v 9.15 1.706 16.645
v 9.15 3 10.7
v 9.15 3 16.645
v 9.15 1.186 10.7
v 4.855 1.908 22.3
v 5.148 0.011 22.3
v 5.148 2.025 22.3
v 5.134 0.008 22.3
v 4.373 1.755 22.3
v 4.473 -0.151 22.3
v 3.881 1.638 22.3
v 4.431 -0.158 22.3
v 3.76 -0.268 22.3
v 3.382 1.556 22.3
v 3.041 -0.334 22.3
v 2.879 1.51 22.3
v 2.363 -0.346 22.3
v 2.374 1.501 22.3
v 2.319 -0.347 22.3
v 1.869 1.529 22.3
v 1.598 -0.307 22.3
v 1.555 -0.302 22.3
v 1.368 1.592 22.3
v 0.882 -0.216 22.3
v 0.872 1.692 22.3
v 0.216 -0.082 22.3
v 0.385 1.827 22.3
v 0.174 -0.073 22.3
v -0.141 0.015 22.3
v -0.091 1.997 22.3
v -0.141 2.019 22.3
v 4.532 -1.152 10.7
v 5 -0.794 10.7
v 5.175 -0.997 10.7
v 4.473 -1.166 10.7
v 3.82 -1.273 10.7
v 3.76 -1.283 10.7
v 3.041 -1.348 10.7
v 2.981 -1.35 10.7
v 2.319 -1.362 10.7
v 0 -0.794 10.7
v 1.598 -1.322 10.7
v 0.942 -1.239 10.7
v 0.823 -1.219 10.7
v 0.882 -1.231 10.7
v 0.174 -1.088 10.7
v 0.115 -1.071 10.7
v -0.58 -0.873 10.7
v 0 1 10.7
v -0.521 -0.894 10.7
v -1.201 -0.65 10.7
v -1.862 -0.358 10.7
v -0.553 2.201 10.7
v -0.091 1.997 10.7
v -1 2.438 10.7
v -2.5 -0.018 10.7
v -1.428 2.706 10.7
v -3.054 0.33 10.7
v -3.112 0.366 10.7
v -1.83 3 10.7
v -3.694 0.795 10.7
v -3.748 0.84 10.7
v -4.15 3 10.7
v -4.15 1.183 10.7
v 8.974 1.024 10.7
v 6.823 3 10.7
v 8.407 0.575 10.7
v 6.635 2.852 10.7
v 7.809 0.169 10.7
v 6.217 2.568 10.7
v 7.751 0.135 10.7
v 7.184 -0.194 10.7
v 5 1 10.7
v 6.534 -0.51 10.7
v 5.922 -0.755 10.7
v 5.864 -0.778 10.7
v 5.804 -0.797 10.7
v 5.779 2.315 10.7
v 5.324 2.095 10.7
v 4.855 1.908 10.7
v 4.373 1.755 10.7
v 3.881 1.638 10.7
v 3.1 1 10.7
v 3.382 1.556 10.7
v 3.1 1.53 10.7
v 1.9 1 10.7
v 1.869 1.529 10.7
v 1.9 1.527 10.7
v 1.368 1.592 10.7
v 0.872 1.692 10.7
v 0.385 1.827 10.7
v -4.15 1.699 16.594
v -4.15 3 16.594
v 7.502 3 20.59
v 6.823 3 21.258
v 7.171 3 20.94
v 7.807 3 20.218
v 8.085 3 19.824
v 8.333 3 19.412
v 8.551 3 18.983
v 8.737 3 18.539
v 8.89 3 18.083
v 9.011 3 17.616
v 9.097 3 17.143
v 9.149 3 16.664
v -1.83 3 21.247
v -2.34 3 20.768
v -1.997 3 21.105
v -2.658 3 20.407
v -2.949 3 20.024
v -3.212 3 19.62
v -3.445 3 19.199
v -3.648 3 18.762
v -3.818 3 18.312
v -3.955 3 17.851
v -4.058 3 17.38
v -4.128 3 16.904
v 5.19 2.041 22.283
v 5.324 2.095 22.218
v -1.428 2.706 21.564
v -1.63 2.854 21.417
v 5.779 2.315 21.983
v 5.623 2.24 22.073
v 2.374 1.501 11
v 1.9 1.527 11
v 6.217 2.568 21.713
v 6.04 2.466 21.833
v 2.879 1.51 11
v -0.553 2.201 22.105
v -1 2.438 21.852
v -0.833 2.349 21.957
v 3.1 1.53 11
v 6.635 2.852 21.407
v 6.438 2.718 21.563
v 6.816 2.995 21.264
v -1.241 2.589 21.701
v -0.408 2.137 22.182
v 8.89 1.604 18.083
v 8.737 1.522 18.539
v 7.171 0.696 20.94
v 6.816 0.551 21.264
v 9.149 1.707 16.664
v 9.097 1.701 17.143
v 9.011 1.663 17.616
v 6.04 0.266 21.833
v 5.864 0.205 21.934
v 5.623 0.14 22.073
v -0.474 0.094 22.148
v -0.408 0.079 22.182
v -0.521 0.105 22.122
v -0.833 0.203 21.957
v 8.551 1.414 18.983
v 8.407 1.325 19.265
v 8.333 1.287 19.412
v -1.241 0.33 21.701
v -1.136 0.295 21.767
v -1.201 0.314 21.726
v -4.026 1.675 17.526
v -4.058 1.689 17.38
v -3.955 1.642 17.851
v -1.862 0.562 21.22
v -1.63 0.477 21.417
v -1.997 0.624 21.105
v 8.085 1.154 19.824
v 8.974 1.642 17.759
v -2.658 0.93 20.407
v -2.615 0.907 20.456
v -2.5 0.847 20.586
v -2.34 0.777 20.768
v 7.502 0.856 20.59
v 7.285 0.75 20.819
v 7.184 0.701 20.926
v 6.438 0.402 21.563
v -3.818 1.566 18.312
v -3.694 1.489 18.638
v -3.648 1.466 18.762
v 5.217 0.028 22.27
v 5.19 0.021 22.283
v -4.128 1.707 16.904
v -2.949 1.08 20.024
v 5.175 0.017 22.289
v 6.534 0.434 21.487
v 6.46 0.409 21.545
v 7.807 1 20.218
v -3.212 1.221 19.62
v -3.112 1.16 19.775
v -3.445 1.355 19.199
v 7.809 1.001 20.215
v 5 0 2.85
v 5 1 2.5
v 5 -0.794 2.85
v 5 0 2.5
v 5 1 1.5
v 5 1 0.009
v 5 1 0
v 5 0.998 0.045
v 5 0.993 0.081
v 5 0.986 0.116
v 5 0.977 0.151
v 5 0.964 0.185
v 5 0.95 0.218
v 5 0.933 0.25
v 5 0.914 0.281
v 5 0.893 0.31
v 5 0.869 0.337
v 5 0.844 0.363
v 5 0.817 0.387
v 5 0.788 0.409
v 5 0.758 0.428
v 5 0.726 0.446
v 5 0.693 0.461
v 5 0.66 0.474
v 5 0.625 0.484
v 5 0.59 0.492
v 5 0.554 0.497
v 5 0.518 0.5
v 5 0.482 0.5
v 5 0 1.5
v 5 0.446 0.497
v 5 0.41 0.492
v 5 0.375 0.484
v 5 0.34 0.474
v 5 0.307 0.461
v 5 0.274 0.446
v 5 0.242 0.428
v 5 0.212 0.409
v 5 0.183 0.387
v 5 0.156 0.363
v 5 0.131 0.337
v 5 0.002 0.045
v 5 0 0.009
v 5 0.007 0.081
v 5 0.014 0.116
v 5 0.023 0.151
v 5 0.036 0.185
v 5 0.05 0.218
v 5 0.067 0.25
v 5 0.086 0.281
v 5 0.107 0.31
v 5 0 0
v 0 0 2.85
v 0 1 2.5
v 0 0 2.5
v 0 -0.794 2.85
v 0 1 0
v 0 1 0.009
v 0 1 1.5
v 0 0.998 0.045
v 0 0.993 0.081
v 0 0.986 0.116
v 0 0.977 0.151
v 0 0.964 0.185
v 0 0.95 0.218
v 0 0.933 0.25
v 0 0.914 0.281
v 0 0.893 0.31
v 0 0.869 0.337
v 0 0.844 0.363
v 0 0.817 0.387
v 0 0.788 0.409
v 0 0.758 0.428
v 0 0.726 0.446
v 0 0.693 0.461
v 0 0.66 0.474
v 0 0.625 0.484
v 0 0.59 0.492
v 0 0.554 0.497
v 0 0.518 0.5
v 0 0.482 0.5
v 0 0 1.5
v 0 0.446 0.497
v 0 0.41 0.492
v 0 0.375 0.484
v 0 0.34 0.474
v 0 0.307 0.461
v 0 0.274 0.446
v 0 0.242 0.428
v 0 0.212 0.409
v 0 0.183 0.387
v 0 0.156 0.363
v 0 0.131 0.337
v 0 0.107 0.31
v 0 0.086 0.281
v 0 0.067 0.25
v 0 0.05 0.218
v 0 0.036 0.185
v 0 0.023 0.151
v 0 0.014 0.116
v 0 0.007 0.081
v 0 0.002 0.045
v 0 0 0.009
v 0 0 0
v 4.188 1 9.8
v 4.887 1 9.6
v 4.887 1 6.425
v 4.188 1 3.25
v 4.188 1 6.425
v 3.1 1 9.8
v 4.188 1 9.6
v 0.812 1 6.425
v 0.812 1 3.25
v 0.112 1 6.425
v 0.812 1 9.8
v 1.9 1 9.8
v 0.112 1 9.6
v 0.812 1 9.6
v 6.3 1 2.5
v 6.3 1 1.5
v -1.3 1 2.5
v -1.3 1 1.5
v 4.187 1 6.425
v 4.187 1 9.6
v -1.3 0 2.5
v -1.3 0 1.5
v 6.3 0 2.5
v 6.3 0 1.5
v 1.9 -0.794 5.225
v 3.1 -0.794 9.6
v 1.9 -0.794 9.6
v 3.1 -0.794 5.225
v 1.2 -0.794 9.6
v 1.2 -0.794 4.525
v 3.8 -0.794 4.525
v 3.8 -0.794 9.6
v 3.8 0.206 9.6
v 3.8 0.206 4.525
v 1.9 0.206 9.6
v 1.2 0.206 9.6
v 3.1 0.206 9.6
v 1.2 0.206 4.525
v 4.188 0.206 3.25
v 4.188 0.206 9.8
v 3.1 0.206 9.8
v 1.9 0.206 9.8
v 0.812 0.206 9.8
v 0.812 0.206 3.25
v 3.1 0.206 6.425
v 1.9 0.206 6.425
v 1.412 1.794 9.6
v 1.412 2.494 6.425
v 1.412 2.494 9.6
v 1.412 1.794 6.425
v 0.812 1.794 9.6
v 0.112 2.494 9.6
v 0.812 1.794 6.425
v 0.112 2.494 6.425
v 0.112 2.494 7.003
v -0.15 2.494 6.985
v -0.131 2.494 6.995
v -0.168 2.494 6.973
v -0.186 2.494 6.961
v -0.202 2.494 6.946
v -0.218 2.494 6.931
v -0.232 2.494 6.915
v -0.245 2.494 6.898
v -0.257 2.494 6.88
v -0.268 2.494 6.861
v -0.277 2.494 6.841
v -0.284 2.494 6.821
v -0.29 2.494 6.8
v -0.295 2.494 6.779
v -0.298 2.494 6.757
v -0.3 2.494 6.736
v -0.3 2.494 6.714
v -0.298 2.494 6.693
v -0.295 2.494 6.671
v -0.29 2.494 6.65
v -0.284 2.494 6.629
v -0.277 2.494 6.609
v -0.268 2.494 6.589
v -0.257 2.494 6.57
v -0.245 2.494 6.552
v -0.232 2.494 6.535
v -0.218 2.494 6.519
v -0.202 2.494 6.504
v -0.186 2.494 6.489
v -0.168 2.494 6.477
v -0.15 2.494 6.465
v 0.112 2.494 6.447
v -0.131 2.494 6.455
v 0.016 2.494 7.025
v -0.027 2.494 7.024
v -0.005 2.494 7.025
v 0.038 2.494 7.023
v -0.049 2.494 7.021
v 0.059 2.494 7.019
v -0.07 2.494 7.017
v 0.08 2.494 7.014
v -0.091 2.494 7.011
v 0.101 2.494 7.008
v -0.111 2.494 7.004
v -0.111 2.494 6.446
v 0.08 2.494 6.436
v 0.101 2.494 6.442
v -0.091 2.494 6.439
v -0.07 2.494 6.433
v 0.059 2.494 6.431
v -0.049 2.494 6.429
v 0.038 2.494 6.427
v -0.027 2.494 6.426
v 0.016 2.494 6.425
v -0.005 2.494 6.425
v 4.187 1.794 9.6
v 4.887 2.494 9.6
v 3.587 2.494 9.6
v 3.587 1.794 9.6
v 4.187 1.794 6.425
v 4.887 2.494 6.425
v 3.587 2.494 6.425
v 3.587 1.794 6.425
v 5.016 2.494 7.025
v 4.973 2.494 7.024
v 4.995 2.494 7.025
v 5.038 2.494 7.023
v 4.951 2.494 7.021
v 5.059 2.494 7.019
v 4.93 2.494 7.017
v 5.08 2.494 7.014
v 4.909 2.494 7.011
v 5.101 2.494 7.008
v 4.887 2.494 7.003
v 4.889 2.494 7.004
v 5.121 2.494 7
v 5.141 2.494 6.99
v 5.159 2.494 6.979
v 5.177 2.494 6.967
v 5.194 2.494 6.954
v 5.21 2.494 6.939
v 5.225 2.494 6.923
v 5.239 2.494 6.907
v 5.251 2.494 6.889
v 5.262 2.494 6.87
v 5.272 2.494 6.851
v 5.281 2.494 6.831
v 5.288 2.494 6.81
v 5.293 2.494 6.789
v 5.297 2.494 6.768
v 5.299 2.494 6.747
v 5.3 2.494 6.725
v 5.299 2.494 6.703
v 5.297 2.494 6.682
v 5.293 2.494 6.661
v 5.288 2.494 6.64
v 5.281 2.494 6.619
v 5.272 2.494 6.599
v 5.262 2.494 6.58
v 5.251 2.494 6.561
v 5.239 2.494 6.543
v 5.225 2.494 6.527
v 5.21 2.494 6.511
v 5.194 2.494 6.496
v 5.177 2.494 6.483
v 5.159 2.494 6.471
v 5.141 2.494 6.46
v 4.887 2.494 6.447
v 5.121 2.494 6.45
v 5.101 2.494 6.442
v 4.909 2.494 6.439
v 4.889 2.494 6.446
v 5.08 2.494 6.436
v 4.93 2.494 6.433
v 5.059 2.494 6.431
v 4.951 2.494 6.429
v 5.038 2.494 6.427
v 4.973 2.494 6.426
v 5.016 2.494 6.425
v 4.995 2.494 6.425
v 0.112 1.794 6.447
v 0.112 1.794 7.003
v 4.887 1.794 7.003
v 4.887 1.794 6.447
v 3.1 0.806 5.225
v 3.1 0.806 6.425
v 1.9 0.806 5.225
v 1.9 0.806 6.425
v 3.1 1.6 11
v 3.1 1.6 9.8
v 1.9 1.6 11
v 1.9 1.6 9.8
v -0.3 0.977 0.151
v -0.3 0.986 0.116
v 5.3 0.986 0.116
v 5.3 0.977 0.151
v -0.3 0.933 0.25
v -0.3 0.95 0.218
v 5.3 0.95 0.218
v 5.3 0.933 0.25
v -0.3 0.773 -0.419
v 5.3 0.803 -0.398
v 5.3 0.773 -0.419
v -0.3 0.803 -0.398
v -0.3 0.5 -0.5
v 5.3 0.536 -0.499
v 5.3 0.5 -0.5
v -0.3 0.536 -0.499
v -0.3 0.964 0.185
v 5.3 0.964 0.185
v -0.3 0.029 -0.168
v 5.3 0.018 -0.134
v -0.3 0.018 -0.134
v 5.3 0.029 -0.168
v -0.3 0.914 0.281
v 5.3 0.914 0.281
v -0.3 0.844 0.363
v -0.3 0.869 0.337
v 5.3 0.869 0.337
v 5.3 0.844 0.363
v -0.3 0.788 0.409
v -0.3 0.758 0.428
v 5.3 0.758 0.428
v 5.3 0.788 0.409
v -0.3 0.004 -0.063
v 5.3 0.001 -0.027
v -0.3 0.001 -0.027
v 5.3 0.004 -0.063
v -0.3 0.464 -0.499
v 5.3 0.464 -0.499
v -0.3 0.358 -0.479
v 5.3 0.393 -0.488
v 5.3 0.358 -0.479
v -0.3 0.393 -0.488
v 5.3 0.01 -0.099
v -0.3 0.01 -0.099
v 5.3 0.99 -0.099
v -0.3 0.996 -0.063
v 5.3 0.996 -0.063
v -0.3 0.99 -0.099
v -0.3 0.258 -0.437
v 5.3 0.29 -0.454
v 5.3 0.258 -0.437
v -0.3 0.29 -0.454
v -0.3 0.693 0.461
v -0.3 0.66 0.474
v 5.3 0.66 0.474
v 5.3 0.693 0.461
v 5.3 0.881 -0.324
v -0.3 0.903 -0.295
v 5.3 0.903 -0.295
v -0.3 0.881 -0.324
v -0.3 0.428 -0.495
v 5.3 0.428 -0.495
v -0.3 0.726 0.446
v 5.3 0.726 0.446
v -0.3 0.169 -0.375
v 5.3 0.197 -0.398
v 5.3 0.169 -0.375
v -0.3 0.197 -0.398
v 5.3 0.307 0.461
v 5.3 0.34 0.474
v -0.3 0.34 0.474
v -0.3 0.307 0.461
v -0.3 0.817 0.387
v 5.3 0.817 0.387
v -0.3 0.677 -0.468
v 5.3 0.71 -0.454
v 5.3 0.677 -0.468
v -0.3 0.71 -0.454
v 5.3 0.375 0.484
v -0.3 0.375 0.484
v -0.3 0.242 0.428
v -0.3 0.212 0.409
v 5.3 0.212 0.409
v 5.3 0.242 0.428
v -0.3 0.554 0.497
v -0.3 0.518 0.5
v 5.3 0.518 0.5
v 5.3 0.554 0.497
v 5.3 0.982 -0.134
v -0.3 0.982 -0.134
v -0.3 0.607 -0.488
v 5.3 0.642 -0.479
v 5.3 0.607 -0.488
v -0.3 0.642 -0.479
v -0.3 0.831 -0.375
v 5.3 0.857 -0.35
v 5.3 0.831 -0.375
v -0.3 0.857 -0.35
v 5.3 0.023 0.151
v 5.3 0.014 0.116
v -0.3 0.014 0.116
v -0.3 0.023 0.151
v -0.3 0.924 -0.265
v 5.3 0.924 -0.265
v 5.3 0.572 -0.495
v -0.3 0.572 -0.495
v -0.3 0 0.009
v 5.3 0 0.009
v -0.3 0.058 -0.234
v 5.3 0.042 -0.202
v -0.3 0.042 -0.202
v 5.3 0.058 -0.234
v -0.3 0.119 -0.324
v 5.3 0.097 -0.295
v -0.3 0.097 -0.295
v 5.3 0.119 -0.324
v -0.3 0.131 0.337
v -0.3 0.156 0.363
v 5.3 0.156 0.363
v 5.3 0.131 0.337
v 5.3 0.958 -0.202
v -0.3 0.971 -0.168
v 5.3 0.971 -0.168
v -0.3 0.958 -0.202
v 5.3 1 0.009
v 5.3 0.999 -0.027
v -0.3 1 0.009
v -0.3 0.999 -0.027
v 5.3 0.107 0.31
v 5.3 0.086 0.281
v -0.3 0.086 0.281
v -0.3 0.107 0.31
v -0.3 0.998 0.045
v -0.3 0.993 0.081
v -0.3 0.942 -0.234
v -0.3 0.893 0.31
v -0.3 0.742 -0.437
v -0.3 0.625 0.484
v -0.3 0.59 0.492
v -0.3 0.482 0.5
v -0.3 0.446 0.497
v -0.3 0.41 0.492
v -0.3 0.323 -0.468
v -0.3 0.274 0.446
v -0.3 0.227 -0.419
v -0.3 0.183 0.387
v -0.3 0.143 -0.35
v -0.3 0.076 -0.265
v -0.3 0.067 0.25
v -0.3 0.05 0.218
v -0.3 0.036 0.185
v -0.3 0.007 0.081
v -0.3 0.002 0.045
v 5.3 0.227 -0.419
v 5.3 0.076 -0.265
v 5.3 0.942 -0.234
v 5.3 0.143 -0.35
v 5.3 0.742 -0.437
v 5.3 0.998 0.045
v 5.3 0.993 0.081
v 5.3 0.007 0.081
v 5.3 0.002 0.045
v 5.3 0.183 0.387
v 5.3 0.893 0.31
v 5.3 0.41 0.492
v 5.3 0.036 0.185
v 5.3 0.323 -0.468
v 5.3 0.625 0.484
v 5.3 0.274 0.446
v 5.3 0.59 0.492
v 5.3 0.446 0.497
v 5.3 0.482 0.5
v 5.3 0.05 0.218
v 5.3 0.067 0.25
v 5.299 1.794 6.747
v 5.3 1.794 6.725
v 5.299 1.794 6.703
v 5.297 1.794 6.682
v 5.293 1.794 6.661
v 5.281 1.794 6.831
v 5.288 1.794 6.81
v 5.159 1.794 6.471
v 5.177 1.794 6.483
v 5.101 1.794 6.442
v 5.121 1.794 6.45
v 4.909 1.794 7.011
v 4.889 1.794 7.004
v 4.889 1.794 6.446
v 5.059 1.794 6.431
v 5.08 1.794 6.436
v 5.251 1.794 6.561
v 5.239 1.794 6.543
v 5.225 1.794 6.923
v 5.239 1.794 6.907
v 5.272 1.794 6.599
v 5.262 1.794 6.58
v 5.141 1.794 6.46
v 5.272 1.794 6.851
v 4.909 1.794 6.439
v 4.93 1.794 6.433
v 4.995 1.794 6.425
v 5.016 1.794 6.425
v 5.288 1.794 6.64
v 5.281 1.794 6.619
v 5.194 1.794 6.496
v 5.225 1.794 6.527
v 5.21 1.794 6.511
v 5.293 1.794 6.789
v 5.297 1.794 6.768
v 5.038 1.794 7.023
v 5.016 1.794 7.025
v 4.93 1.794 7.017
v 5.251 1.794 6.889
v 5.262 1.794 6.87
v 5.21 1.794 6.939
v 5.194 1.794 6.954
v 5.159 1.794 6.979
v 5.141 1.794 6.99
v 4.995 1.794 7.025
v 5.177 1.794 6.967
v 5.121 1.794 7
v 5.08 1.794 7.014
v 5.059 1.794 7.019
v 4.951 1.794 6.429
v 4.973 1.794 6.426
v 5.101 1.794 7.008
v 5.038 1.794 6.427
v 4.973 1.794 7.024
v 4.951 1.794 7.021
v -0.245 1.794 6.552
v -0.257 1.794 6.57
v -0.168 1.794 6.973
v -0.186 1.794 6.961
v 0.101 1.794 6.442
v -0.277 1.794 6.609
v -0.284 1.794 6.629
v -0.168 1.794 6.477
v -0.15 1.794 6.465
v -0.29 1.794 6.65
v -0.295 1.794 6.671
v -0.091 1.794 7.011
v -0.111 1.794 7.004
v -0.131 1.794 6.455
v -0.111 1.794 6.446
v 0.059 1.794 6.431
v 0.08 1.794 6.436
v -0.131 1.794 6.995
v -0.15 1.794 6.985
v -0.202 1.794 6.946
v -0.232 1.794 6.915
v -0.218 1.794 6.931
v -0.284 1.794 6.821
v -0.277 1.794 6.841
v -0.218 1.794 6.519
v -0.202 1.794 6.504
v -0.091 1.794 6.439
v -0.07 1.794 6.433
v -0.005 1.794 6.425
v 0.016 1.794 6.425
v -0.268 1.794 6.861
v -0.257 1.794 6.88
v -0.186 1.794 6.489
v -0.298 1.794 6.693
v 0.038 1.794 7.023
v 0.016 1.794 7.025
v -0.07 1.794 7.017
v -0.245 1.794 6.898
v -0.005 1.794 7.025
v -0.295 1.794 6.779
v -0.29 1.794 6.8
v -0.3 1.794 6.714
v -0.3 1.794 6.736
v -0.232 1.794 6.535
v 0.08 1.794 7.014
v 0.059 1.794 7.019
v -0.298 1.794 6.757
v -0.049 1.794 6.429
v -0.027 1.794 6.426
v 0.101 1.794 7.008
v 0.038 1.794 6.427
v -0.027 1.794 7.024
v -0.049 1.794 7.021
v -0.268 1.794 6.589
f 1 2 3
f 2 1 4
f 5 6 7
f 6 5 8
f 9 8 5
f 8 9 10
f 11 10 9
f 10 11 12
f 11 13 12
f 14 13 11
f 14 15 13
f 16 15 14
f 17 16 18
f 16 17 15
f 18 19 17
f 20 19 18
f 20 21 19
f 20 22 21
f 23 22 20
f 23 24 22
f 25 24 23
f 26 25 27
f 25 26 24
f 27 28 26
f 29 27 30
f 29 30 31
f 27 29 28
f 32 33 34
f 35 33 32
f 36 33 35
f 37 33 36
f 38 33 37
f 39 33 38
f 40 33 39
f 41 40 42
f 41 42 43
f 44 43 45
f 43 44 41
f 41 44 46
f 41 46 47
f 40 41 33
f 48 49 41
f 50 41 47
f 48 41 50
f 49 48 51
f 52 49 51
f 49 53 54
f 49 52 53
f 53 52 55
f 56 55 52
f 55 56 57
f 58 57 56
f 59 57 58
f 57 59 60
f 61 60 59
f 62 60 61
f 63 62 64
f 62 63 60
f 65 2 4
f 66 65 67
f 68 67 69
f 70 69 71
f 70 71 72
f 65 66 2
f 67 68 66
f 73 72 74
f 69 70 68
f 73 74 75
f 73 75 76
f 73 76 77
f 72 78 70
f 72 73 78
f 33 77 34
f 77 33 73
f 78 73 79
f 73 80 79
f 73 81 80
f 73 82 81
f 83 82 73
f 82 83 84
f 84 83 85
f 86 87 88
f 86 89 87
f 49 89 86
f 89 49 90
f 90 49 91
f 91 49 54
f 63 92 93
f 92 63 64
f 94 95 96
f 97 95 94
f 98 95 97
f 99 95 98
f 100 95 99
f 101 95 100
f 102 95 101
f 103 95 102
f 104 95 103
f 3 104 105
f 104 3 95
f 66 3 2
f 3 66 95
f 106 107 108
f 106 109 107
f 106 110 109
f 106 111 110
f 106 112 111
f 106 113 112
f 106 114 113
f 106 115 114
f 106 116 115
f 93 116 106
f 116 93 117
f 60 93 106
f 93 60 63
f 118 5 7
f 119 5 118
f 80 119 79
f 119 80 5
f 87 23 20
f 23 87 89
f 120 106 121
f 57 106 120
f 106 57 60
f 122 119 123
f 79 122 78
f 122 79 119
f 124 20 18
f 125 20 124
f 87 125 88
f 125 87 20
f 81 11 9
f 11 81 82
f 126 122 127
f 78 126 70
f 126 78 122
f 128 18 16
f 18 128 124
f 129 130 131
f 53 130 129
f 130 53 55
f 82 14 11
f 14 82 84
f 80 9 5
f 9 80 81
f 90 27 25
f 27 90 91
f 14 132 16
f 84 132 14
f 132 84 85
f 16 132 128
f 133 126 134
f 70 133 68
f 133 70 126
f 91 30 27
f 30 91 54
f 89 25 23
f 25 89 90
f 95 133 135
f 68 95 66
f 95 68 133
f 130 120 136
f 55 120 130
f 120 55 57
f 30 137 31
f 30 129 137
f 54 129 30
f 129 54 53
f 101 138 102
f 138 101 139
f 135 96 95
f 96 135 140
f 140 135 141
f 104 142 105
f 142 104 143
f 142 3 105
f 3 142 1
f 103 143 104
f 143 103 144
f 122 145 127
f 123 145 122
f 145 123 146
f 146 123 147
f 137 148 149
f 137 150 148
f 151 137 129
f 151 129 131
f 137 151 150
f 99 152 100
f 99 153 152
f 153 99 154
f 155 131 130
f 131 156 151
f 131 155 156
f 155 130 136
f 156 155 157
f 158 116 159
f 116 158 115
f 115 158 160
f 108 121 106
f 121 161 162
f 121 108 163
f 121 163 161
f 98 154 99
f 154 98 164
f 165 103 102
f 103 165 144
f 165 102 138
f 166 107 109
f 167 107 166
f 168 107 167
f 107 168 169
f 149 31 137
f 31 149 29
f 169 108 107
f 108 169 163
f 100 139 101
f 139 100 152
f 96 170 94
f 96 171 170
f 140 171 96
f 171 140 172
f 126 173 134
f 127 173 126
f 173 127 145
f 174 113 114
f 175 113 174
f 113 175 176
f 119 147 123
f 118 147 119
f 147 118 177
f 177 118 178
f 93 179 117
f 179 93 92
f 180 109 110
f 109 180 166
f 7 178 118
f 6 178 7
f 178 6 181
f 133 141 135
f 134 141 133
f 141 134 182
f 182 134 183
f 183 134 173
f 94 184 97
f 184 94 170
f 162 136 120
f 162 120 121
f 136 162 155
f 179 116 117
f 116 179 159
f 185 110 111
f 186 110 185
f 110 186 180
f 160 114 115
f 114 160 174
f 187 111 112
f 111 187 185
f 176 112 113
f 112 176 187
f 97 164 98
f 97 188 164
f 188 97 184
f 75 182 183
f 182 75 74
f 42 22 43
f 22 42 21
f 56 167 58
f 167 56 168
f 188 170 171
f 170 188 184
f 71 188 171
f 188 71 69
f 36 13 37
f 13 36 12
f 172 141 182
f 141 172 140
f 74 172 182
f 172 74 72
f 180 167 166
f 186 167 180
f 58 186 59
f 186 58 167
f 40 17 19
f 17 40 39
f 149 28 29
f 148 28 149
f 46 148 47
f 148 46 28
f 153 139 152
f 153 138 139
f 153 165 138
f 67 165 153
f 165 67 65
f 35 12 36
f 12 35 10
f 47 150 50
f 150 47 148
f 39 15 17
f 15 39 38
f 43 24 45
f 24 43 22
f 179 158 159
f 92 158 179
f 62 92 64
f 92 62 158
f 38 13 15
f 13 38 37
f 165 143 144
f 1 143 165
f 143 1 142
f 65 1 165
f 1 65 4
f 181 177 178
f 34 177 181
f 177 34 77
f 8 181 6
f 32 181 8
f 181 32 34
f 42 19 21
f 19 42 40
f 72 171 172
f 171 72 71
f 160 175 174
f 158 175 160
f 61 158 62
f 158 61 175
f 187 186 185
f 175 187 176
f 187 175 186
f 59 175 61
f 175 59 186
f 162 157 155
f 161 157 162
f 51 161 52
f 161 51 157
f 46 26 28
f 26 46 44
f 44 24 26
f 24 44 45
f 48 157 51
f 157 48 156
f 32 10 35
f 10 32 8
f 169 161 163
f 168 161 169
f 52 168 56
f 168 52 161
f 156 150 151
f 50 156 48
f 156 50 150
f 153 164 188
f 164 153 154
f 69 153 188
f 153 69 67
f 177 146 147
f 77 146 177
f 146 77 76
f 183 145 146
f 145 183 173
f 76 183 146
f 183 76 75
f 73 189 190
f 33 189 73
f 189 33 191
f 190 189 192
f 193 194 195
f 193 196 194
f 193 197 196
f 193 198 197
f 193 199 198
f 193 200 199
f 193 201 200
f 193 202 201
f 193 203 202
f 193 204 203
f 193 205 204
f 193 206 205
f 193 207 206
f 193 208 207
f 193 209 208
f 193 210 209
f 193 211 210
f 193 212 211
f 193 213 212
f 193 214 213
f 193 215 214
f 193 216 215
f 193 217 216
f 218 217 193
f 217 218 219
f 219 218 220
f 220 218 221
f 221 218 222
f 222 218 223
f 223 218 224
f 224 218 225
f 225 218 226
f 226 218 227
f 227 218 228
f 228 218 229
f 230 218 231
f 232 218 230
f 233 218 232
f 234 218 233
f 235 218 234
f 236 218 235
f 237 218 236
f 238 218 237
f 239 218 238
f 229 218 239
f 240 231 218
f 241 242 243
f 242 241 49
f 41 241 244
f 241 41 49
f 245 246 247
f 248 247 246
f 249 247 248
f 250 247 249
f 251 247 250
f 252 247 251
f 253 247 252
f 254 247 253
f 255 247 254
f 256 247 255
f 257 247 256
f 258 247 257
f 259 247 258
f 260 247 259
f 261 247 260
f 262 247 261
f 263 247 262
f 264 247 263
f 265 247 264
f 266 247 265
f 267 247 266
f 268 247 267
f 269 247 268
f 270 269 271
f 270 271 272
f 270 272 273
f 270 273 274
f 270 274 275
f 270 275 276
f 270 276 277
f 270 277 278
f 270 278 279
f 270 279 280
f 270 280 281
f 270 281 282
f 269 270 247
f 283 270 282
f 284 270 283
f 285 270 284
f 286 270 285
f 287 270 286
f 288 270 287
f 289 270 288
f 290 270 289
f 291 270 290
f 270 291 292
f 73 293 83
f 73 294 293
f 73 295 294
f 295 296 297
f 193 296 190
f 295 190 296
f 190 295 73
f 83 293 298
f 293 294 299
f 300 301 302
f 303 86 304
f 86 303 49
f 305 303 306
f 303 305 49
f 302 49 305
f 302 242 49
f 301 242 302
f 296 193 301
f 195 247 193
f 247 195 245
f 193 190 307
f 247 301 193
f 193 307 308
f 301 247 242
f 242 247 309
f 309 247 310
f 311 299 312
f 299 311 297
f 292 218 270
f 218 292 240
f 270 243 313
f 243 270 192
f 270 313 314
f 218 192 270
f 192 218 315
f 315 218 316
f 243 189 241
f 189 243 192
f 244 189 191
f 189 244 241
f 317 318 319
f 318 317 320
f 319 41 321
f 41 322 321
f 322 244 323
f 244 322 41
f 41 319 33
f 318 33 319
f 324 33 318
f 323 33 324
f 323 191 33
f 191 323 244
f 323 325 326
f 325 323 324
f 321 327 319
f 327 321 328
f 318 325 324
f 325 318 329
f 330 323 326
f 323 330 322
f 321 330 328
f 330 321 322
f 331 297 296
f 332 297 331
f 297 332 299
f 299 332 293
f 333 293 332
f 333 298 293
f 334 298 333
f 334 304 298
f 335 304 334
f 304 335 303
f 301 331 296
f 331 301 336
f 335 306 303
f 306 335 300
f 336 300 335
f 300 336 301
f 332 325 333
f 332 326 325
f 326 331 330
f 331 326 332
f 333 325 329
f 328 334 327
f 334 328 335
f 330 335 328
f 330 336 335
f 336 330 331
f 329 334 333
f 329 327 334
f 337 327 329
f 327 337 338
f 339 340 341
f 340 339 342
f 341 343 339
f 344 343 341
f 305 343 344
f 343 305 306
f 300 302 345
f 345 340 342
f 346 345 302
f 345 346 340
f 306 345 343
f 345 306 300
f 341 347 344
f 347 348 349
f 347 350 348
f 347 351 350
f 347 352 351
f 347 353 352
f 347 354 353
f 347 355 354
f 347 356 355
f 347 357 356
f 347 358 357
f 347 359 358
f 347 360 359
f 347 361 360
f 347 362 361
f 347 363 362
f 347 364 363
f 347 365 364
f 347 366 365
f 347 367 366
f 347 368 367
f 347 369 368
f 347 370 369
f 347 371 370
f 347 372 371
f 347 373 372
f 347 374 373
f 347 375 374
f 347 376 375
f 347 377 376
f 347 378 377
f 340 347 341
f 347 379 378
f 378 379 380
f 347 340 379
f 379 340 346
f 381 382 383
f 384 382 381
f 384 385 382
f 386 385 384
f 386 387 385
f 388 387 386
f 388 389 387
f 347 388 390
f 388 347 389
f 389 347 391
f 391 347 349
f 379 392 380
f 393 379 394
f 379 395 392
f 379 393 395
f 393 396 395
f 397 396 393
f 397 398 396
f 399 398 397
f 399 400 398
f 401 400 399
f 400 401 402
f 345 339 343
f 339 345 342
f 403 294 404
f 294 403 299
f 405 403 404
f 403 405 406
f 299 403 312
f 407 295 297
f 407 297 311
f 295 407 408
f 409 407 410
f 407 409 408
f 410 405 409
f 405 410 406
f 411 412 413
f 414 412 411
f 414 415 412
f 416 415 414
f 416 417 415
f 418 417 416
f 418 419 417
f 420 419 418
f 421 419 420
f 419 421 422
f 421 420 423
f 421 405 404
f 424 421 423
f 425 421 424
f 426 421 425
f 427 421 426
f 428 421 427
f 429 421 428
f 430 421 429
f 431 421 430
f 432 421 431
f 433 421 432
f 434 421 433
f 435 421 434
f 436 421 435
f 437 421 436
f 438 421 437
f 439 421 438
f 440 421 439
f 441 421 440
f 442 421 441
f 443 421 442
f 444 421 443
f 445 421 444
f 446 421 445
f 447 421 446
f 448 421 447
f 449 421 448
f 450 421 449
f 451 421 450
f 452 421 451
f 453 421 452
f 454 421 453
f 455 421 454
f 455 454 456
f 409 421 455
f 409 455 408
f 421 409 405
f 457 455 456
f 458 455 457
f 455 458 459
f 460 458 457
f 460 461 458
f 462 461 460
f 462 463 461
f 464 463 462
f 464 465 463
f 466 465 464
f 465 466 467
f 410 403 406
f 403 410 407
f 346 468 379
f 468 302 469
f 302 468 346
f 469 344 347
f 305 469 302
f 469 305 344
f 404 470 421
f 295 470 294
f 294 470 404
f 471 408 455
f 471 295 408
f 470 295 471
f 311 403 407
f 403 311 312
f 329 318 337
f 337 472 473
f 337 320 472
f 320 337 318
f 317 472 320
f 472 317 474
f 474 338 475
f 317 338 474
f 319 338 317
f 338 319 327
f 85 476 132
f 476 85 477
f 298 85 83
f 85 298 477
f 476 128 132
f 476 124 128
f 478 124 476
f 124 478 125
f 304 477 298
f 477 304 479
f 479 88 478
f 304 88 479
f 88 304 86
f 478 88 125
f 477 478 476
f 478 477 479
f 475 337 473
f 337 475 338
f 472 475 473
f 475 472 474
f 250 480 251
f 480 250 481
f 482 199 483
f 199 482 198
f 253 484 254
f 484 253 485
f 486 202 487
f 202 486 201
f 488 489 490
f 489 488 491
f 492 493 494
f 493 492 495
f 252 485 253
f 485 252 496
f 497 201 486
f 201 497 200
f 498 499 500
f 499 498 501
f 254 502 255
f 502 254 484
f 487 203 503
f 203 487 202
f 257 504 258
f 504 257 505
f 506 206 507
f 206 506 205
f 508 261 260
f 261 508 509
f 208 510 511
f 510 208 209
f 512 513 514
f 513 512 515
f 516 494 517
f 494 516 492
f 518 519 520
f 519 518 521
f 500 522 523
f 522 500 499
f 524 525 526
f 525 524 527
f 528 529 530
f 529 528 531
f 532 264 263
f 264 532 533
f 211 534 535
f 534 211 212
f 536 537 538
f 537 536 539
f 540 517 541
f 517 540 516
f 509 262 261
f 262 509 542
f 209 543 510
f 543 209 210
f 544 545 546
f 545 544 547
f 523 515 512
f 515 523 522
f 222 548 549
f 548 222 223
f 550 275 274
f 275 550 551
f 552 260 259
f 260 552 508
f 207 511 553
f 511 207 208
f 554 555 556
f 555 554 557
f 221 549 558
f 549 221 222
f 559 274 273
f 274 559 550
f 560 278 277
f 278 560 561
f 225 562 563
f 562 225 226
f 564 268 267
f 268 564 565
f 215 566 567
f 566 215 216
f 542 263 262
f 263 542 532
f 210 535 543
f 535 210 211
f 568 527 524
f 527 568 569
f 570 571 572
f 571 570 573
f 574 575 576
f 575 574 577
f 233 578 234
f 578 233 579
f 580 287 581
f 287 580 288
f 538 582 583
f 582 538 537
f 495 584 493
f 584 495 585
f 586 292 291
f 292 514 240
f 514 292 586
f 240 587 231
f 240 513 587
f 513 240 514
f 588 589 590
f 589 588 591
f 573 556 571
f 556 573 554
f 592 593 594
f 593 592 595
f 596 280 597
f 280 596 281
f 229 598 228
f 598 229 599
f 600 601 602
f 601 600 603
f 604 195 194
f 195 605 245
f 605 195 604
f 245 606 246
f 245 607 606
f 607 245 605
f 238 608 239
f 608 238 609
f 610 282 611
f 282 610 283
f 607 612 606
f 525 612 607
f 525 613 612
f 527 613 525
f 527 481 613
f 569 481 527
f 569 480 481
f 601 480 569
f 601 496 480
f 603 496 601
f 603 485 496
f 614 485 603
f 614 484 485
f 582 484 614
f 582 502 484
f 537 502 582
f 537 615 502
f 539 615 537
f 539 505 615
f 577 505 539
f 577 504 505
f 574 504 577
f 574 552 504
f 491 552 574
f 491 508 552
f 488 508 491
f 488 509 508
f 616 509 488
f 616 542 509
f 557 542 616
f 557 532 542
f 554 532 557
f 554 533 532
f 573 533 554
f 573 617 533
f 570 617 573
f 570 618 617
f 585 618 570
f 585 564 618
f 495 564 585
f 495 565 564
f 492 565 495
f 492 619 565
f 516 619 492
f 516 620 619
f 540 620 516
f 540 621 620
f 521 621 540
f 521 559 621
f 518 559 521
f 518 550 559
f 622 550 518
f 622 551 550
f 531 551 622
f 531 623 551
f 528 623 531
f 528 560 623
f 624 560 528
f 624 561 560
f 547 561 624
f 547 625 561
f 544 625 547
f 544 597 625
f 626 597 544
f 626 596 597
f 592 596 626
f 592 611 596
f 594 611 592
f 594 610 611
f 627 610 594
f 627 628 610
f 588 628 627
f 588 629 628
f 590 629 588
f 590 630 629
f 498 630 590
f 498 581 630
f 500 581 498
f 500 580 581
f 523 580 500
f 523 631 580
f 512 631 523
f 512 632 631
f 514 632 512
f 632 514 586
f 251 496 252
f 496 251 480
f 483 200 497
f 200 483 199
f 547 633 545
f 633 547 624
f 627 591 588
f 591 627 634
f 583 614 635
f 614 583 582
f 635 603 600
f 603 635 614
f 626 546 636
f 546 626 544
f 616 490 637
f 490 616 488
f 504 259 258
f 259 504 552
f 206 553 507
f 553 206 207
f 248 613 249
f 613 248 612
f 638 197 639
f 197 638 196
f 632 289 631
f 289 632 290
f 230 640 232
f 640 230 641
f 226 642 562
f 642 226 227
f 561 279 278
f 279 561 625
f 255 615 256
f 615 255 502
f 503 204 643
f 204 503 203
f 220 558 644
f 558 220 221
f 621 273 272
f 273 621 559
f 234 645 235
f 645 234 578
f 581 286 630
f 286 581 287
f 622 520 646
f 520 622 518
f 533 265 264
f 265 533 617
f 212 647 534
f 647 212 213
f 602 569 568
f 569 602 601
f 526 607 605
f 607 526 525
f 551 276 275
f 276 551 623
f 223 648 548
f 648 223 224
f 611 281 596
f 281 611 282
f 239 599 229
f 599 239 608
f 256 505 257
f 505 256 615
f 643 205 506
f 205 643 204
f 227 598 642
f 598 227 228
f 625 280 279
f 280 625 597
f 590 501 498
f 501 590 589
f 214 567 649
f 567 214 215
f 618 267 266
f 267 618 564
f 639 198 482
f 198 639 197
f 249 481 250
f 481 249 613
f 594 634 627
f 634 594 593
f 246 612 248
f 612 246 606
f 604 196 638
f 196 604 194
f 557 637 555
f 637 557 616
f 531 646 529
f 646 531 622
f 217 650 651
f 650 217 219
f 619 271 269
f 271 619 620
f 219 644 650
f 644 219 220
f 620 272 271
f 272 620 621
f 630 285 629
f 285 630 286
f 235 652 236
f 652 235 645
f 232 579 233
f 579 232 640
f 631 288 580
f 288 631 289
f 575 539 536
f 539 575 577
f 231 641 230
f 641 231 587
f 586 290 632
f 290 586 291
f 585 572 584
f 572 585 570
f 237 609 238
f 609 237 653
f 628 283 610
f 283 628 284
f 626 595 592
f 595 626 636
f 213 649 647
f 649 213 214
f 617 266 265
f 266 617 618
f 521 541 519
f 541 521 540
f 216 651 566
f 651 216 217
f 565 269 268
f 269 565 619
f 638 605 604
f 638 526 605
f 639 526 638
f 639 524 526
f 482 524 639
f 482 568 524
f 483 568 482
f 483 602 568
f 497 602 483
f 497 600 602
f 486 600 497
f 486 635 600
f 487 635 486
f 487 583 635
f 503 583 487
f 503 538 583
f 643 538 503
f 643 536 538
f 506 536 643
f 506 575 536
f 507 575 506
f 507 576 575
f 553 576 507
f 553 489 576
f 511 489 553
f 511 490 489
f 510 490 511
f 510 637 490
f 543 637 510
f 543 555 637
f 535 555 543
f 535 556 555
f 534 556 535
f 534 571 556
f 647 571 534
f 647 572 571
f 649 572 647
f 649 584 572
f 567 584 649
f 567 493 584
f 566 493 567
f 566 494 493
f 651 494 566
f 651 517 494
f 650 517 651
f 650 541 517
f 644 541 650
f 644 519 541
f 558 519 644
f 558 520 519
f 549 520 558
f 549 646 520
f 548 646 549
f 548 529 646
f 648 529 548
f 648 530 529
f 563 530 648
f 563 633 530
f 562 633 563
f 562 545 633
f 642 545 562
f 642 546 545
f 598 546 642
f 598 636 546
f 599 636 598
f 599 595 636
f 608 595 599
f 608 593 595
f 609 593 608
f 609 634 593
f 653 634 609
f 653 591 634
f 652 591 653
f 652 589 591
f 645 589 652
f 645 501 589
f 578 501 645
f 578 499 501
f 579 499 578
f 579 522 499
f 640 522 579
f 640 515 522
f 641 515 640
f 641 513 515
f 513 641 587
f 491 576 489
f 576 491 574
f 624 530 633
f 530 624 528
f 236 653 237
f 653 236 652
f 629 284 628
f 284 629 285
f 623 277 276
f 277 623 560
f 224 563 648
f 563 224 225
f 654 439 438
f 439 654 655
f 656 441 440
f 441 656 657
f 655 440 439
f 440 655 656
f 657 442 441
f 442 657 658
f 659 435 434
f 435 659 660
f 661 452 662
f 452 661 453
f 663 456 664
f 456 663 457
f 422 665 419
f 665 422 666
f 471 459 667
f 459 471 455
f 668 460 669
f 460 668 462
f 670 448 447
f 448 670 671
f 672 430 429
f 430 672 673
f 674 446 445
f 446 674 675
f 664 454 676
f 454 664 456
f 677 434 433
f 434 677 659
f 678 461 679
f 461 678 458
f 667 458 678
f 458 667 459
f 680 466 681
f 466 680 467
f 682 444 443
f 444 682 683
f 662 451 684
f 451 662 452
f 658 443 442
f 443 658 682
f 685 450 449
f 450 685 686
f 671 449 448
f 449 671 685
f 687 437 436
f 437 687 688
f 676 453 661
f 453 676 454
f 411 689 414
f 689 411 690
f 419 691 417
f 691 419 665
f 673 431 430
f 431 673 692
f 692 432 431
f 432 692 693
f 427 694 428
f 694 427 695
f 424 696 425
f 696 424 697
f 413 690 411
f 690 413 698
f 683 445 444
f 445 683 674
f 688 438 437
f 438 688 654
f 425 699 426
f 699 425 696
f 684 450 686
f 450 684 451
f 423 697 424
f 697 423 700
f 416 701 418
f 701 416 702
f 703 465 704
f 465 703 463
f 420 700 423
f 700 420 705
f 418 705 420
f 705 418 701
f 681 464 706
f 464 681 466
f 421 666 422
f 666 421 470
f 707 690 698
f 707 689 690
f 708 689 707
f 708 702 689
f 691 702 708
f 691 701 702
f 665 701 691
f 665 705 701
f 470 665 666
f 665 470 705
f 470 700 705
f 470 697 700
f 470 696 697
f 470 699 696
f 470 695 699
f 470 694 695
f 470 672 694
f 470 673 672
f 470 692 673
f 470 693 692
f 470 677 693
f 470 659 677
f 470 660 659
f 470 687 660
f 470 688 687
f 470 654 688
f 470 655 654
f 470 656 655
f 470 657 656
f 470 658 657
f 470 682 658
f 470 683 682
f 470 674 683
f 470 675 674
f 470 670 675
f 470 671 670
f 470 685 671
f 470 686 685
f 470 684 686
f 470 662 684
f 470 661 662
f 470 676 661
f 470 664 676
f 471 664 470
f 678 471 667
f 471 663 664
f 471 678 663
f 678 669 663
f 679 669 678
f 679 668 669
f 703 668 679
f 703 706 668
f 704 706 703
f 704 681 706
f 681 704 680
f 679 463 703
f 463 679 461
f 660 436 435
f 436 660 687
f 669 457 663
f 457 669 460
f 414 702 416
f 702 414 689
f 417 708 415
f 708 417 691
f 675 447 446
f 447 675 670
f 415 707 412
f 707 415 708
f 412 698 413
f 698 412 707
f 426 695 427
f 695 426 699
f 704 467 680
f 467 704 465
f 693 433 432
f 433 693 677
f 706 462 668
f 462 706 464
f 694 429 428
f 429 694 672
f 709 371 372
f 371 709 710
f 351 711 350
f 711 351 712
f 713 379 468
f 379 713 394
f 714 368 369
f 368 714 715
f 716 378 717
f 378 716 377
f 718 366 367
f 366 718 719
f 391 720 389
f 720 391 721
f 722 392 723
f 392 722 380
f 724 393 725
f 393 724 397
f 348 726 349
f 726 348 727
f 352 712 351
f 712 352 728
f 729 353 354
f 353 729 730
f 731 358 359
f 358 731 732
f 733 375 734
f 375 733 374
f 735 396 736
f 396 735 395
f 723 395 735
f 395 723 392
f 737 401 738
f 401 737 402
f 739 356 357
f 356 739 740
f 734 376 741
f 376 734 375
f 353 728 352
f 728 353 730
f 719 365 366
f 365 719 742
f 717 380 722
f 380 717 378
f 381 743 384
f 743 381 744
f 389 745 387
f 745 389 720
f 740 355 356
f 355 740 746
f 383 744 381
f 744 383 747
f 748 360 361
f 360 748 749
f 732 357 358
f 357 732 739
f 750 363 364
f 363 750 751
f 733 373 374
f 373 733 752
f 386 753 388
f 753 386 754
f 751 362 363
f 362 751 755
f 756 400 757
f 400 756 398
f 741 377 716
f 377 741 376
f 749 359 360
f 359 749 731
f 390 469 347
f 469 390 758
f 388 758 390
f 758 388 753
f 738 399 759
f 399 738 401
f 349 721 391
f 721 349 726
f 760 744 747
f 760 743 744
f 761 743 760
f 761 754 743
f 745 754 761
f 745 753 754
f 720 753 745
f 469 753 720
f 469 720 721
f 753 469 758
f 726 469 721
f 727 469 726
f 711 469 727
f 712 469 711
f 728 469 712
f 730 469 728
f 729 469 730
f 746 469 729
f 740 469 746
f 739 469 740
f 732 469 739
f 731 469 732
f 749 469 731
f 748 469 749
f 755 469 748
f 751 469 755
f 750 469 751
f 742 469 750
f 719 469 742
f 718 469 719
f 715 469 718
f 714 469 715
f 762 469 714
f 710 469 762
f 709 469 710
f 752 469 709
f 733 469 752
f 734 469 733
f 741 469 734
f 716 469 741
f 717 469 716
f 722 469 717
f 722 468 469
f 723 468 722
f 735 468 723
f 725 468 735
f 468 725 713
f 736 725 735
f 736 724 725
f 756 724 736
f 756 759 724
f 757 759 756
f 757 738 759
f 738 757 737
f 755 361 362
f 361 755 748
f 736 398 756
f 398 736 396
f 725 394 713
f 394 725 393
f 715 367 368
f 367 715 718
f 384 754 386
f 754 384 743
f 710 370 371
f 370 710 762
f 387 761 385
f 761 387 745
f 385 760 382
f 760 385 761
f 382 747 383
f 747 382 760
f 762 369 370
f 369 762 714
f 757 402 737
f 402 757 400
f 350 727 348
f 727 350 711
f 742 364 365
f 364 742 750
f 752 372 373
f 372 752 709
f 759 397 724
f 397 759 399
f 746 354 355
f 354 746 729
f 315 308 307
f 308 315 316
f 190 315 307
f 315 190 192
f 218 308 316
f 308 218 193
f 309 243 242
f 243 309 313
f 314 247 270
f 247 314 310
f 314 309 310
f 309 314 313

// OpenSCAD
/*
    This file is part of the DodoHand project. This project aims to create 
    an open implementation of the DataHand keyboard, capable of being created
    with commercial 3D printing services.

    Copyright (C) 2013 Scott Fohey

    This program is free software: you can redistribute it and/or modify
    it under the terms of the GNU General Public License as published by
    the Free Software Foundation, either version 3 of the License, or
    (at your option) any later version.

    This program is distributed in the hope that it will be useful,
    but WITHOUT ANY WARRANTY; without even the implied warranty of
    MERCHANTABILITY or FITNESS FOR A PARTICULAR PURPOSE.  See the
    GNU General Public License for more details.

    You should have received a copy of the GNU General Public License
    along with this program.  If not, see <http://www.gnu.org/licenses/>.
*/

// this is the 5-key assembly scad file.
use <lever.scad>;

big_key(0,0,0);
